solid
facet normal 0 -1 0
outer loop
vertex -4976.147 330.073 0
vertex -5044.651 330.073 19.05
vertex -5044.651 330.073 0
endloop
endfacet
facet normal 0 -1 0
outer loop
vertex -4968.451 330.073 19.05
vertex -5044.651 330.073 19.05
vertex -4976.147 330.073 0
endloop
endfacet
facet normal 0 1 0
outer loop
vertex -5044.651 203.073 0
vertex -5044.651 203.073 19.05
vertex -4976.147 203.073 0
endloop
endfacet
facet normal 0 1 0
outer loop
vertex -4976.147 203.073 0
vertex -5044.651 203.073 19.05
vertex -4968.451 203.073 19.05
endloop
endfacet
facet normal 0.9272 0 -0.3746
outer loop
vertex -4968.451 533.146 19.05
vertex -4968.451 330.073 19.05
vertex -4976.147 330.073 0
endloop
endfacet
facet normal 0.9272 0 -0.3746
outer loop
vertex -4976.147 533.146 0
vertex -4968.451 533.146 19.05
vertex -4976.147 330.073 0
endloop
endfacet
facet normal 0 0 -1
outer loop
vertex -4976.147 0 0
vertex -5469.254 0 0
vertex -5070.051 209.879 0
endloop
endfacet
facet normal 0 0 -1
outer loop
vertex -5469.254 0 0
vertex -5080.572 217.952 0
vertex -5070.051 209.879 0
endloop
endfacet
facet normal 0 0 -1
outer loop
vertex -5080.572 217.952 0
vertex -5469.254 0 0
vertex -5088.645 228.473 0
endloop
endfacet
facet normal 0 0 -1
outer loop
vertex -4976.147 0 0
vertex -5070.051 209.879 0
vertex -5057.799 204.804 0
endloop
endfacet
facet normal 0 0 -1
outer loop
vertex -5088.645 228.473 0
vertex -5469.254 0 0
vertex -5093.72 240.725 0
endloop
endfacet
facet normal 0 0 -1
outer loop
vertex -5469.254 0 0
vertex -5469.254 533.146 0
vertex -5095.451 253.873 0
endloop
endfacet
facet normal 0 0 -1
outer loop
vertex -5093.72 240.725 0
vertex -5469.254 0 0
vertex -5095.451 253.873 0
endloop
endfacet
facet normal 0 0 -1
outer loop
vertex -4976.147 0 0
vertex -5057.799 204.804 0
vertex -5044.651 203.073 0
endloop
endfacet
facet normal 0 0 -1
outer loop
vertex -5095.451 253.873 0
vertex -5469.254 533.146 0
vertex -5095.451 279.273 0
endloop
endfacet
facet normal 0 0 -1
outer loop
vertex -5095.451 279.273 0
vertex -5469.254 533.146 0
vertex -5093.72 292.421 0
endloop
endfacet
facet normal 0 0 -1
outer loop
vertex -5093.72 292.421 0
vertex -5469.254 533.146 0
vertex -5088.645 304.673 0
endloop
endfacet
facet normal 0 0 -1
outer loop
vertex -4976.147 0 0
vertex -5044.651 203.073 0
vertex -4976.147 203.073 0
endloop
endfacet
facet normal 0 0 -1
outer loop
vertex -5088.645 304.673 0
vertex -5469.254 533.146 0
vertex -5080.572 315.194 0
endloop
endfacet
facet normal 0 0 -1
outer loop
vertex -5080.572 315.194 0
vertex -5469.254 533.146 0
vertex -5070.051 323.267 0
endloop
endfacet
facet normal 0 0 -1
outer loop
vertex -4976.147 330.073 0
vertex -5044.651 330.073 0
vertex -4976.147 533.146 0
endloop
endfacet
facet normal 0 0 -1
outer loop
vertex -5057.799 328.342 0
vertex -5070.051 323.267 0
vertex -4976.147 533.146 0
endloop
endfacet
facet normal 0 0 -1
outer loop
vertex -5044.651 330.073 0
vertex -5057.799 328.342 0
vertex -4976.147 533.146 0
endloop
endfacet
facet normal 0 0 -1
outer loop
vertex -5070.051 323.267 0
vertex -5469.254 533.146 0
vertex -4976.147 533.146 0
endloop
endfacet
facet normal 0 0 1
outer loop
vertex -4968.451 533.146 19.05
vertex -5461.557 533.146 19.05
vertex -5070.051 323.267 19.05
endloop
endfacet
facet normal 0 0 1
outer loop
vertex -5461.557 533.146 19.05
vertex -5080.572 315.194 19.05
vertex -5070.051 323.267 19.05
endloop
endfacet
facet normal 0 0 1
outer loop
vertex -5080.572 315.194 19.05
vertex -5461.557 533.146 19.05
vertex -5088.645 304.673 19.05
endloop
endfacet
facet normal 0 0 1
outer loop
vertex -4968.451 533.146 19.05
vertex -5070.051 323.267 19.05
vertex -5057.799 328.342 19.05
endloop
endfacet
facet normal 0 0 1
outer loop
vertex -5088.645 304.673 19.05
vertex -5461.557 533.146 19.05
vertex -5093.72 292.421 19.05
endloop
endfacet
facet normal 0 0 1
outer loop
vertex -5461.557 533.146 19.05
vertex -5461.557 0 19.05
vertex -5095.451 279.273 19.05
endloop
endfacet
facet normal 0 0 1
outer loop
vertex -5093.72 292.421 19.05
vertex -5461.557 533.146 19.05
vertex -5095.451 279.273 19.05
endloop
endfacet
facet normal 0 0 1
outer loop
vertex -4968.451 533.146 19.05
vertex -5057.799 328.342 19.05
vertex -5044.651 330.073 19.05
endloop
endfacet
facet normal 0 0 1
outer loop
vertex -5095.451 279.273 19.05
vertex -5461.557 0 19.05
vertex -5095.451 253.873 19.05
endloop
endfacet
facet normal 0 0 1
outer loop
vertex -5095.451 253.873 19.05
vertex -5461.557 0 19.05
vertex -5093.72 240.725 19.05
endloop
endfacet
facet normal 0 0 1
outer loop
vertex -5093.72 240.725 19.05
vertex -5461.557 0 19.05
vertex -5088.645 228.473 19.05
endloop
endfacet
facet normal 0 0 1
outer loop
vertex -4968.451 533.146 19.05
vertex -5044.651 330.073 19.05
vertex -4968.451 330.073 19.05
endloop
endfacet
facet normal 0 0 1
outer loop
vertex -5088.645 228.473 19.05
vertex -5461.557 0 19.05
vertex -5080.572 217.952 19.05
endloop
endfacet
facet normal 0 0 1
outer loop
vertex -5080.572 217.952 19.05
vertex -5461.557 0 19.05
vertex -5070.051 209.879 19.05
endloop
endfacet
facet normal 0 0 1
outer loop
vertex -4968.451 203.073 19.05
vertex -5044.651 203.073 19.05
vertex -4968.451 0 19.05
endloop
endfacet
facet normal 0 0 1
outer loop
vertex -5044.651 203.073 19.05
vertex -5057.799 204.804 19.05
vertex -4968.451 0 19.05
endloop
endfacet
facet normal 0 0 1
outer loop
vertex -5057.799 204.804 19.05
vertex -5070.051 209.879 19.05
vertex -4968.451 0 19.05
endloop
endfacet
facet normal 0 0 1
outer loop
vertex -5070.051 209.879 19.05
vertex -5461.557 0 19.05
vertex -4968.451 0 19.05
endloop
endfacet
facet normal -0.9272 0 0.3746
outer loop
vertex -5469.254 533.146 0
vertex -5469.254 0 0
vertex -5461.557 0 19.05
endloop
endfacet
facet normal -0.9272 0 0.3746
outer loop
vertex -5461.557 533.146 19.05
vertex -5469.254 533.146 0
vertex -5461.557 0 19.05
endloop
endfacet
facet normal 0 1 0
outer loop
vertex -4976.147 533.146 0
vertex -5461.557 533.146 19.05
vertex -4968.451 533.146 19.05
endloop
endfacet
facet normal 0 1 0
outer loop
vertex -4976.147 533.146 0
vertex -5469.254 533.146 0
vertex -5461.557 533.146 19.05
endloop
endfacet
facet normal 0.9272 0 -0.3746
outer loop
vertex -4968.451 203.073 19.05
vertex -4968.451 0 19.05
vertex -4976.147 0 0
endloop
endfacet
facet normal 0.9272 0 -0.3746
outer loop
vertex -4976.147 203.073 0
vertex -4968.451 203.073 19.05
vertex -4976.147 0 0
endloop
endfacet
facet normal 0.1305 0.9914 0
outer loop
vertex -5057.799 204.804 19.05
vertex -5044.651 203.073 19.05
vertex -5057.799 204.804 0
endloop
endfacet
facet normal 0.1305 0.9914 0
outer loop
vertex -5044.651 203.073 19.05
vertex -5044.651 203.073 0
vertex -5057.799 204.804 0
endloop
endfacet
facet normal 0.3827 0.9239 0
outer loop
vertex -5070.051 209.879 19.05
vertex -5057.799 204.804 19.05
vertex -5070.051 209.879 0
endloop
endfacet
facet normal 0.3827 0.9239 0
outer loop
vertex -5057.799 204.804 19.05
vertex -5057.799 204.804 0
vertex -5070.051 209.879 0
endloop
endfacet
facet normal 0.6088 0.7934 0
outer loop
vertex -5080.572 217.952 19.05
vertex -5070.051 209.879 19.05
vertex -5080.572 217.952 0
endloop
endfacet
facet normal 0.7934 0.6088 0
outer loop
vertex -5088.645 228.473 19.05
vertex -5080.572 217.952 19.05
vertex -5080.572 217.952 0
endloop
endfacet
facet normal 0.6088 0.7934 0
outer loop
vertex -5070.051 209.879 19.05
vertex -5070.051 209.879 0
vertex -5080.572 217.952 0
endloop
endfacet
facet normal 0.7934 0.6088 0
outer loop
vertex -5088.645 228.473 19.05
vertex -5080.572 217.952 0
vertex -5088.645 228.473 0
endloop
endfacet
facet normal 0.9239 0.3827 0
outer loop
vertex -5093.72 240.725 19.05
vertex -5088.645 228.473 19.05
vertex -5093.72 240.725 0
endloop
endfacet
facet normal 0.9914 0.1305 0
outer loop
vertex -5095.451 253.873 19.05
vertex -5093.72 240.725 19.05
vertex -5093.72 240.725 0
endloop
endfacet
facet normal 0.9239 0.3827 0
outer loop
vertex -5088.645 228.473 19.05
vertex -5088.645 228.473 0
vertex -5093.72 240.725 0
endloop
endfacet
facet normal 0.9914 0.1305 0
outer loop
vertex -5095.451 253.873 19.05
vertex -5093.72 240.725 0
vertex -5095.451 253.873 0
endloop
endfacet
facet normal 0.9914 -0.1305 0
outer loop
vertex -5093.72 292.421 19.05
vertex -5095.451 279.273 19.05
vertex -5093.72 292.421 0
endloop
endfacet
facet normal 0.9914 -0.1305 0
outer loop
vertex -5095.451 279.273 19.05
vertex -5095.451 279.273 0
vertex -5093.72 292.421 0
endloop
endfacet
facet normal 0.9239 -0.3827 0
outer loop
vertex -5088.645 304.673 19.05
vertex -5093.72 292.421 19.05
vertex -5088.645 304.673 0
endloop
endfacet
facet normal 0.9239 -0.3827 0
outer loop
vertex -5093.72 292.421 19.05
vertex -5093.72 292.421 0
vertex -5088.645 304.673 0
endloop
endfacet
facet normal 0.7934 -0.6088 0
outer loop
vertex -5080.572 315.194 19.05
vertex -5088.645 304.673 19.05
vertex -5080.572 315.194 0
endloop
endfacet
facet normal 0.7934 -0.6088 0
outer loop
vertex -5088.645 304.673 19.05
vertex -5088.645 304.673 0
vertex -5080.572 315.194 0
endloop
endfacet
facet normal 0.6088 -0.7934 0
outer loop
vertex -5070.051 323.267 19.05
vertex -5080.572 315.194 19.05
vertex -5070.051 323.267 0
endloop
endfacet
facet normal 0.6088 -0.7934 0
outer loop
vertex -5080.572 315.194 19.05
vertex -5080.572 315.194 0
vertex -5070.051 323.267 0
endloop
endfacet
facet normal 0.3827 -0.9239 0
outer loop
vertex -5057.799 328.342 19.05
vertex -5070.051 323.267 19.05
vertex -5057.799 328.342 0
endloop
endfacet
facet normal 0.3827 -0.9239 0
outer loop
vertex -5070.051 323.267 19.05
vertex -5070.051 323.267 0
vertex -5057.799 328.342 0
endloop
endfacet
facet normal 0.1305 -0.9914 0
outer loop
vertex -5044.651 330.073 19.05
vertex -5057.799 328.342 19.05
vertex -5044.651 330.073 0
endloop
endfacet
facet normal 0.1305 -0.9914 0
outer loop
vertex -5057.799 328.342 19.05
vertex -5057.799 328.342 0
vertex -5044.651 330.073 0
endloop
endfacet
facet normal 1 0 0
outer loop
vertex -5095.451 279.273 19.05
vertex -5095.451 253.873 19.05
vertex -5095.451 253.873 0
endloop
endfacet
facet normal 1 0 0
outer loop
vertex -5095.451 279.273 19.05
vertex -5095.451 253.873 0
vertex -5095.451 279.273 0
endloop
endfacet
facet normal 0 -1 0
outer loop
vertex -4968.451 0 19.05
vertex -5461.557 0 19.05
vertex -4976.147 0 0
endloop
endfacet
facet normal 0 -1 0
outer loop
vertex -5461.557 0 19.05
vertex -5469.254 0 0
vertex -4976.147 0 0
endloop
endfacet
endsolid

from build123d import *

# Parameters (mm, degrees)
SKETCH1_W           = 493.106084352
SKETCH1_H           = 533.146
BOSS_EXTRUDE1_DEPTH = 19.05
BOSS_EXTRUDE3_DEPTH = 533.146
CUT_EXTRUDE1_DEPTH  = 5496.210802379
SKETCH5_W           = 127
SKETCH5_H           = 127
CUT_EXTRUDE2_DEPTH  = 5496.210802379
FILLET1_R           = 50.8


with BuildPart() as part:
    # Sketch1 → Boss-Extrude1 (new body)
    with BuildSketch(Plane.XY):
        with Locations((-5222.700490325, 266.573)):
            Rectangle(SKETCH1_W, SKETCH1_H)
    extrude(amount=BOSS_EXTRUDE1_DEPTH)

    # Boss-Extrude3: read off the stored shape, not the designer's step
    # Boss-Extrude3 outline → Boss-Extrude3 (add)
    with BuildSketch(Plane(origin=(0, 0, 0), x_dir=(1, 0, 0), z_dir=(0, 1, 0))):
        Polygon((-4976.147448149, -19.05), (-4968.450748546, -19.05), (-4976.147448148, 0), align=None)
    extrude(amount=BOSS_EXTRUDE3_DEPTH)

    # Sketch2 → Cut-Extrude1 (cut, through all)
    with BuildSketch(Plane(origin=(0, 533.146, 0), x_dir=(1, 0, 0), z_dir=(0, 1, 0))):
        Polygon((-5469.253532501, 0), (-5461.556832899, -19.05), (-5469.253532501, -19.05), align=None)
    extrude(amount=-CUT_EXTRUDE1_DEPTH, mode=Mode.SUBTRACT)

    # Sketch5 → Cut-Extrude2 (cut, through all)
    with BuildSketch(Plane.XY.offset(19.05)):
        with Locations((-5031.950748546, 266.573)):
            Rectangle(SKETCH5_W, SKETCH5_H)
    extrude(amount=-CUT_EXTRUDE2_DEPTH, mode=Mode.SUBTRACT)

    # Fillet1
    fillet1_edges = [part.edges().sort_by_distance(p)[0] for p in [
        (-5095.450748546, 330.073, 9.525),
        (-5095.450748546, 203.073, 9.525),
    ]]
    fillet(fillet1_edges, radius=FILLET1_R)


solid = part.part
